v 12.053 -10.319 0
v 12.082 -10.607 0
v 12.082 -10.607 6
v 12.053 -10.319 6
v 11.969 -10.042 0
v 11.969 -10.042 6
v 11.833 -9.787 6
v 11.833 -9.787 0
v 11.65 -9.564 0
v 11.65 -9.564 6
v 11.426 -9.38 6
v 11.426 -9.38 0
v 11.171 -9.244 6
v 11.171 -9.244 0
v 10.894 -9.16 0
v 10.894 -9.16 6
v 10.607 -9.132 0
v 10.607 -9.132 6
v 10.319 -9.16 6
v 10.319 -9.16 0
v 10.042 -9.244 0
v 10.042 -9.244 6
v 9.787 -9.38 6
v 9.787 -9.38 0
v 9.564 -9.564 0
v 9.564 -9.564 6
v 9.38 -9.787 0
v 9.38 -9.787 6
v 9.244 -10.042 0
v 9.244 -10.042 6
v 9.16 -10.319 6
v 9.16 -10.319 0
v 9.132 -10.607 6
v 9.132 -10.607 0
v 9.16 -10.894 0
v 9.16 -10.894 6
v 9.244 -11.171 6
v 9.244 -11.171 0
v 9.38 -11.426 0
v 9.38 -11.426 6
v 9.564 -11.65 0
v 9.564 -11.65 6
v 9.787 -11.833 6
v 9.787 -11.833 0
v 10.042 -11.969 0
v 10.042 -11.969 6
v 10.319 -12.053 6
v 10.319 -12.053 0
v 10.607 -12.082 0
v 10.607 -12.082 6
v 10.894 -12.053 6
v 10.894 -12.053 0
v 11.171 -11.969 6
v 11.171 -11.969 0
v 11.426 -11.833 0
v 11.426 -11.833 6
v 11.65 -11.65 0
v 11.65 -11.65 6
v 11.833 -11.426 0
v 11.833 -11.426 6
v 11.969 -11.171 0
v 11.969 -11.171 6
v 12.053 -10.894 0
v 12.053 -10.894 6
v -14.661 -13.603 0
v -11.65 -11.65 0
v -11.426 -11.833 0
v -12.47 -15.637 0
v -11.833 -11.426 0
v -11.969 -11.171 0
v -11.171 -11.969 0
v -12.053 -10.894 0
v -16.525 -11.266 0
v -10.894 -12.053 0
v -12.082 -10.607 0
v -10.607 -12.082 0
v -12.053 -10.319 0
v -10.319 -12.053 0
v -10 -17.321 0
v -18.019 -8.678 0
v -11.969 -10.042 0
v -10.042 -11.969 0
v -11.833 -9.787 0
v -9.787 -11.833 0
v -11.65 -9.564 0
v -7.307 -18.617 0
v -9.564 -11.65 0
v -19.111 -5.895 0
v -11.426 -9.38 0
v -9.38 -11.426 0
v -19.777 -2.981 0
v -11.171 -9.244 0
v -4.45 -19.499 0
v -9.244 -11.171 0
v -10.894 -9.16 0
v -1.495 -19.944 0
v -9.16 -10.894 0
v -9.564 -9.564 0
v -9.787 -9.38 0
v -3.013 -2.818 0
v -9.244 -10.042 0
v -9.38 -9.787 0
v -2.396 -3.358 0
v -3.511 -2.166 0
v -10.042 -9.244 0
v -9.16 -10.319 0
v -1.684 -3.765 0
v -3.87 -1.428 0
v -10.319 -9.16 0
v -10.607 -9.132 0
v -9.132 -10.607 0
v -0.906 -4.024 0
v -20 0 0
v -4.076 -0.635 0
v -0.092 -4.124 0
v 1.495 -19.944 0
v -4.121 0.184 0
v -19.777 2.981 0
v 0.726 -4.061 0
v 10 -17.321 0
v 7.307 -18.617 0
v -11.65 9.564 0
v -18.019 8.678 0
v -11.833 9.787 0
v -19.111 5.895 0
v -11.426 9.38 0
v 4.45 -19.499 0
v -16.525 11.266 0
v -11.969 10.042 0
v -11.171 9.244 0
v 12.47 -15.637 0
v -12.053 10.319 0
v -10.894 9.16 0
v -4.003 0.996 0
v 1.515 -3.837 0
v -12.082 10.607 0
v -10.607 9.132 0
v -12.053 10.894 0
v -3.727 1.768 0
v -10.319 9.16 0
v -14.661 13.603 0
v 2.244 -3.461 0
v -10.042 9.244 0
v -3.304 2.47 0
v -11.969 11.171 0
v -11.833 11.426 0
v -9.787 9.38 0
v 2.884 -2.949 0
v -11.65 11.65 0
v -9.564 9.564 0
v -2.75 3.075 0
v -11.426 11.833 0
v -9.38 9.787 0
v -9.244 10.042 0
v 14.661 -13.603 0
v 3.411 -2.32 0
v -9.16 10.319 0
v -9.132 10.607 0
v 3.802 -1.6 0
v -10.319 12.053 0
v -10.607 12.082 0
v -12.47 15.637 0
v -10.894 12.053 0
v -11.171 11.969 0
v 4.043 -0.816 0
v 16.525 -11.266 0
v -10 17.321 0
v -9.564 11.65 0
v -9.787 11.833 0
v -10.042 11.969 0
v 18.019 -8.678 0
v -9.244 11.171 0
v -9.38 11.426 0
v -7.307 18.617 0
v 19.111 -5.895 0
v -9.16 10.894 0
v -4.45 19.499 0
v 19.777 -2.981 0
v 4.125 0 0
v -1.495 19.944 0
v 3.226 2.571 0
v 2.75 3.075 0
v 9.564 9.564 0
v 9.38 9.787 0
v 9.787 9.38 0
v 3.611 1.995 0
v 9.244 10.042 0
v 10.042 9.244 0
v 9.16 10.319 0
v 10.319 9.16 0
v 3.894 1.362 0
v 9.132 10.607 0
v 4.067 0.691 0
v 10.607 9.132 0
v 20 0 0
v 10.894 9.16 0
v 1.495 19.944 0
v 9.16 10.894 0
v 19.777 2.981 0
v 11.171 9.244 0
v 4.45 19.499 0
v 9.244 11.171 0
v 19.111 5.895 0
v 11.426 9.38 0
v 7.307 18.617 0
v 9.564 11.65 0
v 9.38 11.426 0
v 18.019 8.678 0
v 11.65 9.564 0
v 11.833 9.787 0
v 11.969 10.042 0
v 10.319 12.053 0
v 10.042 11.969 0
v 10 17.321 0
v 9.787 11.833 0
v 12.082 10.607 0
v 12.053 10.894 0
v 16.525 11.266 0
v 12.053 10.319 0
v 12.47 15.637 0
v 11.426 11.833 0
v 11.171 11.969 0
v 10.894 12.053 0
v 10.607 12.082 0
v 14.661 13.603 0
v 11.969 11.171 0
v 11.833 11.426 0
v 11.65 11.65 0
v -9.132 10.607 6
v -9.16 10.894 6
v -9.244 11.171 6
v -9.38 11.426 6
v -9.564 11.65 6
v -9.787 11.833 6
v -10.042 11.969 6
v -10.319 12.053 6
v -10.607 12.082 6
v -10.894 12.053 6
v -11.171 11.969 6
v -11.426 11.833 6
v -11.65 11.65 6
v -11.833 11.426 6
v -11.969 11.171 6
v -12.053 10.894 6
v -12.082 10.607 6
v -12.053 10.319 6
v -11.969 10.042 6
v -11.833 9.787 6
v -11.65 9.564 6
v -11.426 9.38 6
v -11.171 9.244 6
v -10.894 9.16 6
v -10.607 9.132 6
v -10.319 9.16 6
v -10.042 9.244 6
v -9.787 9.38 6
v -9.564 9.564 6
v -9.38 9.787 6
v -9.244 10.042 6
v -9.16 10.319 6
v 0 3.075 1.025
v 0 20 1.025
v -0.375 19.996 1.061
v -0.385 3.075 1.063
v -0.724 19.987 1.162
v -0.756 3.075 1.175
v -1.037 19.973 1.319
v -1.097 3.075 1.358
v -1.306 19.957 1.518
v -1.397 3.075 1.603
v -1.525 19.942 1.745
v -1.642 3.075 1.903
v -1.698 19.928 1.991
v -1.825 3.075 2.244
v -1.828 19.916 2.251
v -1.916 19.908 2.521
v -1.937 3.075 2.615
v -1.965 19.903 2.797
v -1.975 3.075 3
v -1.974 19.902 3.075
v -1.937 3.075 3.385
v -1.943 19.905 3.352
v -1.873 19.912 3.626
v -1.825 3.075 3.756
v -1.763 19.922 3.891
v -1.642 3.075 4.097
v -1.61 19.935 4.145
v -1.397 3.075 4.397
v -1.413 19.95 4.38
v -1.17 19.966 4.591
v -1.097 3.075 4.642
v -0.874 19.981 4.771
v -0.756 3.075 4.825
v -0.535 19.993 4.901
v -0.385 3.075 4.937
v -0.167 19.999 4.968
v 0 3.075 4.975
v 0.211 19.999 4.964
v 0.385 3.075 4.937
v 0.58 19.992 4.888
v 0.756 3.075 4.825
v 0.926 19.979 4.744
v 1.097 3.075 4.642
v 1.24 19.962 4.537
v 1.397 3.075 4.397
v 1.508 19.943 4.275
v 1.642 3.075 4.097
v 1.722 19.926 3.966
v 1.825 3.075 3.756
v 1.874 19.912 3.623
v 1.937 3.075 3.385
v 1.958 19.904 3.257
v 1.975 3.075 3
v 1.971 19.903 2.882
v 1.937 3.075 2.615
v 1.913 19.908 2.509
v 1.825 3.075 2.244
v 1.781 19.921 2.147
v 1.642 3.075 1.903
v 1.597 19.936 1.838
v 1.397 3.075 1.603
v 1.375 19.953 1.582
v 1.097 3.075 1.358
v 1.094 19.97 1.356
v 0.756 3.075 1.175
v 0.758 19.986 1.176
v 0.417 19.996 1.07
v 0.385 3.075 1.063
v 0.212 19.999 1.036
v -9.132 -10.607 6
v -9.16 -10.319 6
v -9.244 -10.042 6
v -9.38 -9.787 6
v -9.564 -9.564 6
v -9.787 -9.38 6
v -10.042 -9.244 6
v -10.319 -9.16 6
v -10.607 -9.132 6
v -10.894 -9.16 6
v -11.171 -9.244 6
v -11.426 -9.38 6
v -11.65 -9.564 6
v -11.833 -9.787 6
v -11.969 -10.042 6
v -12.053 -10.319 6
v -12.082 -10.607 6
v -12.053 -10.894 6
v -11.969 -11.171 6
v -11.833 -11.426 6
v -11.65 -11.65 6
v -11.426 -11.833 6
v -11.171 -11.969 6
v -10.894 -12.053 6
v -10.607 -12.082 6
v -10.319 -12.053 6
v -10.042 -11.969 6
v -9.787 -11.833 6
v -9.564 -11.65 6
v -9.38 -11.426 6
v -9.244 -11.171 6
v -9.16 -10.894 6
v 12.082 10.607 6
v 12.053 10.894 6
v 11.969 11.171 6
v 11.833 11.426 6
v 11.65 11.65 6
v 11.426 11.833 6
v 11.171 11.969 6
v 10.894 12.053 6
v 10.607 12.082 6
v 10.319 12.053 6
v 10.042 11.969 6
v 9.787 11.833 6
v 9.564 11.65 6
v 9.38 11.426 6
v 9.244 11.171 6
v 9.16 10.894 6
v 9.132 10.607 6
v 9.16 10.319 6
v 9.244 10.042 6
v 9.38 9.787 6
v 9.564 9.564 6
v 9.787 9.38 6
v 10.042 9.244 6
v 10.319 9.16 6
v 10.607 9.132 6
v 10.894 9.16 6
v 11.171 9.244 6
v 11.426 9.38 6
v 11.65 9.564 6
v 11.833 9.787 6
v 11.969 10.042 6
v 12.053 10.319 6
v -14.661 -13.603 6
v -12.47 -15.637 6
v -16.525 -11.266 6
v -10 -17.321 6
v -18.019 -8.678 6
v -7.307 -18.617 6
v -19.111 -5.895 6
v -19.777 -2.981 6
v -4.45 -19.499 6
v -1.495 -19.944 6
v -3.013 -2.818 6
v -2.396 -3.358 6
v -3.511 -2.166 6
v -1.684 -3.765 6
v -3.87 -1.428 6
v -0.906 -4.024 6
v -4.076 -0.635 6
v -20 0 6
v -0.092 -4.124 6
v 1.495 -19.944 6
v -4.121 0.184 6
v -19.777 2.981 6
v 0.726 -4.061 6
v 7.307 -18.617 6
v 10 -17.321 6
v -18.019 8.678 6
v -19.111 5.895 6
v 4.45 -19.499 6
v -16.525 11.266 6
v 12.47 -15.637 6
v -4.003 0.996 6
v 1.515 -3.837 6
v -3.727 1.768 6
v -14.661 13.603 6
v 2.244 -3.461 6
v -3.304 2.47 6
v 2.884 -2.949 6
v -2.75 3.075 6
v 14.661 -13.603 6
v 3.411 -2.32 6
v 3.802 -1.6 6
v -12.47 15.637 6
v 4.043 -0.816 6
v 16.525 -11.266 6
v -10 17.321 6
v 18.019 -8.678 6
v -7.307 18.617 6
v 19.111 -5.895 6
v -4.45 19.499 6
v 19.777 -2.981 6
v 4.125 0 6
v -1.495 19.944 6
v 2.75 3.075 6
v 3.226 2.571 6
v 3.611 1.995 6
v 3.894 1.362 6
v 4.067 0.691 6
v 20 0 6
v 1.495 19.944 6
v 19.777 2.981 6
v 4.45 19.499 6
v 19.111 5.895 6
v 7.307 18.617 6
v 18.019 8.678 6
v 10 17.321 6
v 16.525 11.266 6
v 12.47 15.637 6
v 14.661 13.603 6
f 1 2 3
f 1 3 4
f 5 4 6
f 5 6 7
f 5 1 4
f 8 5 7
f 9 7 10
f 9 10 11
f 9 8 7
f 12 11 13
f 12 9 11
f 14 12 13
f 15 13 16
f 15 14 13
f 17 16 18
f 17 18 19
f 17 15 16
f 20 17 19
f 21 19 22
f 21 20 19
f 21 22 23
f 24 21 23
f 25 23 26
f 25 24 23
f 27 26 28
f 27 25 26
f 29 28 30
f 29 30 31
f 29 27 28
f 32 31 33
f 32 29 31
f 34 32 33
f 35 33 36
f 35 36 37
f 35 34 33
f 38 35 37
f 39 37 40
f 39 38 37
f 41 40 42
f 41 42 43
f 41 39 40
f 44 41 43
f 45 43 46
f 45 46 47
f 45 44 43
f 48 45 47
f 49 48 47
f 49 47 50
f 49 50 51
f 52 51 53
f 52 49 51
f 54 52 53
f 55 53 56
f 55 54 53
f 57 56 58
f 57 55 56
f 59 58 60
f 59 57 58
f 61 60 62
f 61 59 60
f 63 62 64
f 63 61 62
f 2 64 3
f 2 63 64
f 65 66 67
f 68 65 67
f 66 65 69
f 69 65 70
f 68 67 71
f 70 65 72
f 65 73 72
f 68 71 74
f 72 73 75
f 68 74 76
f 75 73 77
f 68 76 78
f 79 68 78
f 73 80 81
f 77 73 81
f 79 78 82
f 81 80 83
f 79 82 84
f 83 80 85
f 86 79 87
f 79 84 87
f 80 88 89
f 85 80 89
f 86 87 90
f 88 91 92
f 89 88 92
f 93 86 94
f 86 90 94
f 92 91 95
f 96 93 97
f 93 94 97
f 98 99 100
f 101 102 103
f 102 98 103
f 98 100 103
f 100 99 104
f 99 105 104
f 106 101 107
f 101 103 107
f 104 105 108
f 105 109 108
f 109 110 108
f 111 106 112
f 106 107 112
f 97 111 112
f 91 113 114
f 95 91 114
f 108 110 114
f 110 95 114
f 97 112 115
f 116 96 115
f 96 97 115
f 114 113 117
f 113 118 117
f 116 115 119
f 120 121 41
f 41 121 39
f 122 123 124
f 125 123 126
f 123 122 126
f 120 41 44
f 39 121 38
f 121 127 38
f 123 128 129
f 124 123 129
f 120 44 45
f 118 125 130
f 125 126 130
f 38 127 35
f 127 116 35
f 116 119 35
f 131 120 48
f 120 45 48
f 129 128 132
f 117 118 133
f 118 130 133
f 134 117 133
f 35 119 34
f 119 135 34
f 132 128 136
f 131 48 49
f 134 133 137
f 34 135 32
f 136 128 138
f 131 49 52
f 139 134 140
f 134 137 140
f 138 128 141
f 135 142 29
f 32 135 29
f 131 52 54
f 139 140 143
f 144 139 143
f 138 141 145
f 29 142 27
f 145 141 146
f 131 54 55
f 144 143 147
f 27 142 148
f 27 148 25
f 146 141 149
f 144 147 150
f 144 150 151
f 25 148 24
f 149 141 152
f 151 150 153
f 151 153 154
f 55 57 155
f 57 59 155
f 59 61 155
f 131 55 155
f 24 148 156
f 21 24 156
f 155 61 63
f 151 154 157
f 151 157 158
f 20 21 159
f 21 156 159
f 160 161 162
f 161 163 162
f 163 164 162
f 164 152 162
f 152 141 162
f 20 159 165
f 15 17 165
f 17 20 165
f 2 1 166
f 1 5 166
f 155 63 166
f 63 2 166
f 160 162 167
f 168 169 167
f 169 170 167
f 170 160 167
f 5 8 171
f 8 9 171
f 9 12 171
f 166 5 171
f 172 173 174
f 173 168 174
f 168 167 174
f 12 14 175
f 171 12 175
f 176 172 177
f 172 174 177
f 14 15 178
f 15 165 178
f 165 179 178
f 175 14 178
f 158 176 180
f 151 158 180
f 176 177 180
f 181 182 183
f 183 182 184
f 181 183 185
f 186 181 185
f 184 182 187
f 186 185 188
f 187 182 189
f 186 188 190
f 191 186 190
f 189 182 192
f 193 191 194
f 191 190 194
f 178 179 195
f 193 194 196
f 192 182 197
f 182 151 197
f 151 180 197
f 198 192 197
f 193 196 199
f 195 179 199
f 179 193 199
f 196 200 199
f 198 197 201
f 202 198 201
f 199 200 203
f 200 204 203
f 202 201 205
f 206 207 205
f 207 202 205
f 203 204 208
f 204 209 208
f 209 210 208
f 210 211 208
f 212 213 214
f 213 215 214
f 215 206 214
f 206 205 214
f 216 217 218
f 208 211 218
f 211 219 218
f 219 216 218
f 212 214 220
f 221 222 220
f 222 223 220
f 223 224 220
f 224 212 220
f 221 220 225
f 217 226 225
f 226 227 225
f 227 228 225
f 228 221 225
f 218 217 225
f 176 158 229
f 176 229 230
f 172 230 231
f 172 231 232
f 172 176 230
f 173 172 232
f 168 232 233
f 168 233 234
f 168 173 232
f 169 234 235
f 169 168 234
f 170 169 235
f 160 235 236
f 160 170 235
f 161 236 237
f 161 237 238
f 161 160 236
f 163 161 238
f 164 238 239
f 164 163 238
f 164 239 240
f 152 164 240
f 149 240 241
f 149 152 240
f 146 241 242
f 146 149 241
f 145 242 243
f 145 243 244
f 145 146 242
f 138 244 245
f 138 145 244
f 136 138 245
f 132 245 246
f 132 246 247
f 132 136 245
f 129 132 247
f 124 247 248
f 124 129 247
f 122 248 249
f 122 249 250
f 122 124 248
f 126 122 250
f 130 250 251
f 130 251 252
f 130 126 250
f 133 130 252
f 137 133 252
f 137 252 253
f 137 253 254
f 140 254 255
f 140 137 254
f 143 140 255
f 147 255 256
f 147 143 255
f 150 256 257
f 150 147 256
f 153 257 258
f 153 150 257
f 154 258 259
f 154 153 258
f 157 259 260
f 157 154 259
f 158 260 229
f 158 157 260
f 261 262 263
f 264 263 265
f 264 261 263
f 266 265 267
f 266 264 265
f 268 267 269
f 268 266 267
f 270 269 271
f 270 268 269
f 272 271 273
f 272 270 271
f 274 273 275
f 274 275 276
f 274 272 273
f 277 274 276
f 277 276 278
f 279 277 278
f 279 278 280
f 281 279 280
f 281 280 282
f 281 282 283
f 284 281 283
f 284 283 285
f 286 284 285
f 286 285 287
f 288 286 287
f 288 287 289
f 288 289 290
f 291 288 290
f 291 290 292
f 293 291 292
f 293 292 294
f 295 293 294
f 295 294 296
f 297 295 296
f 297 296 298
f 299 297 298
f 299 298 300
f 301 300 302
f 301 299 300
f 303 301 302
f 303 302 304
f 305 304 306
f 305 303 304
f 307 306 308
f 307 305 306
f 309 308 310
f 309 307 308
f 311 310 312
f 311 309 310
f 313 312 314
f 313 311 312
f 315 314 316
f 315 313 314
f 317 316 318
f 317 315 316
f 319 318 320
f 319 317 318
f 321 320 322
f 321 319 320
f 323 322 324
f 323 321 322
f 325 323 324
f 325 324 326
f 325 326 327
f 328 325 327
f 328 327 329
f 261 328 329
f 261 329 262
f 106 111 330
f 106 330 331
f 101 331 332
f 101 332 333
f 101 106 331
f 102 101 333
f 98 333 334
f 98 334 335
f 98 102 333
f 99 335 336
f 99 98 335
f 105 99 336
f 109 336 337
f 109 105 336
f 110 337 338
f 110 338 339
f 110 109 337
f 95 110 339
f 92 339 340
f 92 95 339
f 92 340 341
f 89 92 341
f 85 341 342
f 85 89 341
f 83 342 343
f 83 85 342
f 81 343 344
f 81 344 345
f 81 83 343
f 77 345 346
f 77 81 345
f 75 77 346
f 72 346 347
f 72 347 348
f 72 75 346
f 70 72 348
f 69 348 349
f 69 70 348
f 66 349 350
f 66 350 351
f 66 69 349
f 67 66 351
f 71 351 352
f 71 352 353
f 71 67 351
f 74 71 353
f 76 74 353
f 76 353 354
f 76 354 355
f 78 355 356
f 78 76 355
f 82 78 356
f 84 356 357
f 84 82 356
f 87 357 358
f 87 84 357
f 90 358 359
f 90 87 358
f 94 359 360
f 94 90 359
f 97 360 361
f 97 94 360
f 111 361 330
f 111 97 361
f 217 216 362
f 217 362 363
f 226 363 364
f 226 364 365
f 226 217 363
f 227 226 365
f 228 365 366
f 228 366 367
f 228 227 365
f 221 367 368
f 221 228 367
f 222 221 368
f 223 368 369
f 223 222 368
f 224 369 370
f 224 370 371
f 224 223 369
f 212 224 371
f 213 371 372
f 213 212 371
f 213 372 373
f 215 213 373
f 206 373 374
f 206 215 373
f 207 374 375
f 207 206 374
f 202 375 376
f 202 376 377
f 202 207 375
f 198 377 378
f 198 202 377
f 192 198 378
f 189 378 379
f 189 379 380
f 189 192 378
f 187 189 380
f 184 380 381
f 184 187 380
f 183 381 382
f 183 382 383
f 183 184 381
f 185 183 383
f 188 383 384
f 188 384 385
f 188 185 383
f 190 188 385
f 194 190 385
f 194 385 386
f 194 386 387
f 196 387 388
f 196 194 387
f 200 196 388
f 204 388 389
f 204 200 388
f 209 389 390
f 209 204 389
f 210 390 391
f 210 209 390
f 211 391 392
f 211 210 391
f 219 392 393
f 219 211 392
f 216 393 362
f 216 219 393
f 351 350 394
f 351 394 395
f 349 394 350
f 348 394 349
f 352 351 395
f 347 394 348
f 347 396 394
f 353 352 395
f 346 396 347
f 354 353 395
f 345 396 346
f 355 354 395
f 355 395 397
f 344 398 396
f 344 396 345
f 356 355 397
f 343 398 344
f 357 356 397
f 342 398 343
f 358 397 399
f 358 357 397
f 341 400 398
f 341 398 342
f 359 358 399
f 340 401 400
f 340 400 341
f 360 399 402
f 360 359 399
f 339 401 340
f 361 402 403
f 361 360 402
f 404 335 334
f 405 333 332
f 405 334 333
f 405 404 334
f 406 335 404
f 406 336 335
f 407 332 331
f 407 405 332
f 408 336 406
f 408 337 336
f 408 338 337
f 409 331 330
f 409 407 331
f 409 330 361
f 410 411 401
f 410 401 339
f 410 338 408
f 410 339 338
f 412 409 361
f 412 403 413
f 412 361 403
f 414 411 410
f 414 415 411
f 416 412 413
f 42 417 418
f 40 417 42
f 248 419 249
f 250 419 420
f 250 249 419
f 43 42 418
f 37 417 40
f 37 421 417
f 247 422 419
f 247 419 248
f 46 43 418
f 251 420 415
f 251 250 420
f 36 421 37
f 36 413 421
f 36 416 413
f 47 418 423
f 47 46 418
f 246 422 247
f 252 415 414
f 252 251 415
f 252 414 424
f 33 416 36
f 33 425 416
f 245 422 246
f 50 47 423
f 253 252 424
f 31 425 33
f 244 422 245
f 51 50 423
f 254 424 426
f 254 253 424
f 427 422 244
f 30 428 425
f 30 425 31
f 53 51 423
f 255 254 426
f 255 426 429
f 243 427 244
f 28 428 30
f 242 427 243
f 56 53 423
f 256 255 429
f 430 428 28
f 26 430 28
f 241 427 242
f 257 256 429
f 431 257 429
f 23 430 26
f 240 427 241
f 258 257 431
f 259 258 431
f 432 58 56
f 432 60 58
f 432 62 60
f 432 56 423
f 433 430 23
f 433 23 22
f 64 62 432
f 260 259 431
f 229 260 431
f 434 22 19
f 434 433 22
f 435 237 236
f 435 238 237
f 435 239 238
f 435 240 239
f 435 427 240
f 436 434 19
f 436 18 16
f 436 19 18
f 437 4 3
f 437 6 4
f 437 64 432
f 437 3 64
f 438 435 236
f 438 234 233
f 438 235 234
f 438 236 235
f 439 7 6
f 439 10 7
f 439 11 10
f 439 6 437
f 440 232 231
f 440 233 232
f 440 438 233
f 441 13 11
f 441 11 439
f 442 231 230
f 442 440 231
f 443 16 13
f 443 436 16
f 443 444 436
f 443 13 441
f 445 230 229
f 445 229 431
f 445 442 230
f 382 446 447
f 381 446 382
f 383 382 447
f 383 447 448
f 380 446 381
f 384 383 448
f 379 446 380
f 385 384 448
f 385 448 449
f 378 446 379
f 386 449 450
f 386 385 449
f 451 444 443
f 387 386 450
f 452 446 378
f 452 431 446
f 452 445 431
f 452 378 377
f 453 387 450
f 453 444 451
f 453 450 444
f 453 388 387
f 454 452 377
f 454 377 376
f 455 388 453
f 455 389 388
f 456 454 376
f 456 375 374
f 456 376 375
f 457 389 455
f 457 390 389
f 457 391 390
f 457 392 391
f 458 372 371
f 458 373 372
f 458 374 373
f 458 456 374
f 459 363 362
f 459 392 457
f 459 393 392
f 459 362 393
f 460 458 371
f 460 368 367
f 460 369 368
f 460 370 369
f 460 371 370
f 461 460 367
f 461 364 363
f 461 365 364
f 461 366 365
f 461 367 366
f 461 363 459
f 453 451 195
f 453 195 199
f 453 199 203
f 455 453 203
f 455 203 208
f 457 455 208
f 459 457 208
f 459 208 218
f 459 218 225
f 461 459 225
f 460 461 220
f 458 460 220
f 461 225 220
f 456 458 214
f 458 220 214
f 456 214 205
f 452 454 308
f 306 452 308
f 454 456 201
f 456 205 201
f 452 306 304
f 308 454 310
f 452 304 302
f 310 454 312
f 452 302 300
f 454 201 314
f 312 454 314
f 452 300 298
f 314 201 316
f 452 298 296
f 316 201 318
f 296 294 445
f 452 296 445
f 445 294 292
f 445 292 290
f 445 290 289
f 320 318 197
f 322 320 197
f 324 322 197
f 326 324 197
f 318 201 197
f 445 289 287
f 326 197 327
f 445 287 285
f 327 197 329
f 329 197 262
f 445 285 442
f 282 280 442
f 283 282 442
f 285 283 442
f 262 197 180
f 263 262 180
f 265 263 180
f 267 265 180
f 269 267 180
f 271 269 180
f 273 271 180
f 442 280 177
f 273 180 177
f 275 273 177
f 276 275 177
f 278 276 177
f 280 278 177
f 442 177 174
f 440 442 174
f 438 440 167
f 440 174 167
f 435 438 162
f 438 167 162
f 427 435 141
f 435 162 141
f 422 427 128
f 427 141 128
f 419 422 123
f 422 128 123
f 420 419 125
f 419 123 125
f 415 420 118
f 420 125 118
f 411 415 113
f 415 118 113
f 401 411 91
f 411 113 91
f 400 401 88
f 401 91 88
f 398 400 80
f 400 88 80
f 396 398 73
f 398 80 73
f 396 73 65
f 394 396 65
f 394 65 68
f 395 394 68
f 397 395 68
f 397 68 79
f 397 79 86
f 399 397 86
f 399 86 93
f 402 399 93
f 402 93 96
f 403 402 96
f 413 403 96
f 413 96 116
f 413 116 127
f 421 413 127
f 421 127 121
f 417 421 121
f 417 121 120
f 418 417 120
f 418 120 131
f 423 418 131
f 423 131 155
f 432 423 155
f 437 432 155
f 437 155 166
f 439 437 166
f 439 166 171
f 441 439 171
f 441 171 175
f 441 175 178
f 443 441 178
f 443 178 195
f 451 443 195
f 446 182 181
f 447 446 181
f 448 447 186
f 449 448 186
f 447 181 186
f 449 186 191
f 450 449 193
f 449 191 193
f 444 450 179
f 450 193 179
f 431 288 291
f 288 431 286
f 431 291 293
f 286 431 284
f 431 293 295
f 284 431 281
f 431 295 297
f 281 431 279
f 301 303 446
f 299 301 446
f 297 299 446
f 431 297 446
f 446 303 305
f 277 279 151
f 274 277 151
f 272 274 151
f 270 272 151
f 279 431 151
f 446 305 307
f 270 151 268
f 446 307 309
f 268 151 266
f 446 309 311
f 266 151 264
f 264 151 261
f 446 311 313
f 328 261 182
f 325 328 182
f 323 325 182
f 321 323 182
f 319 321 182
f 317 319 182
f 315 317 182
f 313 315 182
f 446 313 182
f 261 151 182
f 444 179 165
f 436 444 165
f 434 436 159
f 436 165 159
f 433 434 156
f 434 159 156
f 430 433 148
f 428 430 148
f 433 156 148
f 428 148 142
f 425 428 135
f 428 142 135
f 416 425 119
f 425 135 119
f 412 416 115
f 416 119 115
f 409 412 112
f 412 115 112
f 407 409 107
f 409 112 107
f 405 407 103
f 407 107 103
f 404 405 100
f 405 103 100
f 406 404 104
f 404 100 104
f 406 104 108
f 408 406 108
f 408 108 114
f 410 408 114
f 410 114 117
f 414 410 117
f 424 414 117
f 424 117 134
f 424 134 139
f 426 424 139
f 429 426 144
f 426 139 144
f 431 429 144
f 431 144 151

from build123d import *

# Parameters (mm, degrees)
SKETCH1_R               = 20
SKETCH1_R_2             = 1.475
BOSS_EXTRUDE1_DEPTH     = 6
CUT_EXTRUDE1_REACH      = 30.914
CUT_EXTRUDE1_END_RADIUS = 20
SKETCH2_R               = 1.975


with BuildPart() as part:
    # Sketch1 → Boss-Extrude1 (new body)
    # profile 1 of 2: a face of its own
    with BuildSketch(Plane.XY):
        Circle(SKETCH1_R)
        with Locations((-10.606601718, -10.606601718)):
            Circle(SKETCH1_R_2, mode=Mode.SUBTRACT)
        with Locations((10.606601718, -10.606601718)):
            Circle(SKETCH1_R_2, mode=Mode.SUBTRACT)
        with Locations((-10.606601718, 10.606601718)):
            Circle(SKETCH1_R_2, mode=Mode.SUBTRACT)
        with BuildLine():
            ThreePointArc((4.125, 0), (-1.684302549, -3.765468088), (-2.749545417, 3.075))
            ThreePointArc((-2.749545417, 3.075), (0, 4.125), (2.749545417, 3.075))
            ThreePointArc((2.749545417, 3.075), (3.765468088, 1.684302549), (4.125, 0))
        make_face(mode=Mode.SUBTRACT)
        with Locations((10.606601718, 10.606601718)):
            Circle(SKETCH1_R_2, mode=Mode.SUBTRACT)
    # profile 2 of 2: a face of its own
    with BuildSketch(Plane.XY):
        with BuildLine():
            ThreePointArc((2.749545417, 3.075), (0, 4.125), (-2.749545417, 3.075))
            Line((-2.749545417, 3.075), (2.749545417, 3.075))
        make_face()
    extrude(amount=BOSS_EXTRUDE1_DEPTH)

    # Cut-Extrude1: up to this cylinder (the profile starts inside it)
    cut_extrude1_end = Plane(origin=(0, 0, 3), z_dir=(0, 0, -1)) * Cylinder(CUT_EXTRUDE1_END_RADIUS, 102.828, mode=Mode.PRIVATE)
    # Sketch2 → Cut-Extrude1 (cut, up to the surface)
    with BuildSketch(Plane(origin=(0, 0, 0), x_dir=(1, 0, 0), z_dir=(0, 1, 0)), mode=Mode.PRIVATE) as cut_extrude1_sk1:
        with Locations(Location((0, -3, 0), (0, 0, 90))):
            Circle(SKETCH2_R)
    cut_extrude1_tool1 = extrude(cut_extrude1_sk1.sketch, amount=CUT_EXTRUDE1_REACH, mode=Mode.PRIVATE) & cut_extrude1_end
    add(cut_extrude1_tool1.solids().sort_by_distance((0, 0, 3))[0], mode=Mode.SUBTRACT)


solid = part.part
